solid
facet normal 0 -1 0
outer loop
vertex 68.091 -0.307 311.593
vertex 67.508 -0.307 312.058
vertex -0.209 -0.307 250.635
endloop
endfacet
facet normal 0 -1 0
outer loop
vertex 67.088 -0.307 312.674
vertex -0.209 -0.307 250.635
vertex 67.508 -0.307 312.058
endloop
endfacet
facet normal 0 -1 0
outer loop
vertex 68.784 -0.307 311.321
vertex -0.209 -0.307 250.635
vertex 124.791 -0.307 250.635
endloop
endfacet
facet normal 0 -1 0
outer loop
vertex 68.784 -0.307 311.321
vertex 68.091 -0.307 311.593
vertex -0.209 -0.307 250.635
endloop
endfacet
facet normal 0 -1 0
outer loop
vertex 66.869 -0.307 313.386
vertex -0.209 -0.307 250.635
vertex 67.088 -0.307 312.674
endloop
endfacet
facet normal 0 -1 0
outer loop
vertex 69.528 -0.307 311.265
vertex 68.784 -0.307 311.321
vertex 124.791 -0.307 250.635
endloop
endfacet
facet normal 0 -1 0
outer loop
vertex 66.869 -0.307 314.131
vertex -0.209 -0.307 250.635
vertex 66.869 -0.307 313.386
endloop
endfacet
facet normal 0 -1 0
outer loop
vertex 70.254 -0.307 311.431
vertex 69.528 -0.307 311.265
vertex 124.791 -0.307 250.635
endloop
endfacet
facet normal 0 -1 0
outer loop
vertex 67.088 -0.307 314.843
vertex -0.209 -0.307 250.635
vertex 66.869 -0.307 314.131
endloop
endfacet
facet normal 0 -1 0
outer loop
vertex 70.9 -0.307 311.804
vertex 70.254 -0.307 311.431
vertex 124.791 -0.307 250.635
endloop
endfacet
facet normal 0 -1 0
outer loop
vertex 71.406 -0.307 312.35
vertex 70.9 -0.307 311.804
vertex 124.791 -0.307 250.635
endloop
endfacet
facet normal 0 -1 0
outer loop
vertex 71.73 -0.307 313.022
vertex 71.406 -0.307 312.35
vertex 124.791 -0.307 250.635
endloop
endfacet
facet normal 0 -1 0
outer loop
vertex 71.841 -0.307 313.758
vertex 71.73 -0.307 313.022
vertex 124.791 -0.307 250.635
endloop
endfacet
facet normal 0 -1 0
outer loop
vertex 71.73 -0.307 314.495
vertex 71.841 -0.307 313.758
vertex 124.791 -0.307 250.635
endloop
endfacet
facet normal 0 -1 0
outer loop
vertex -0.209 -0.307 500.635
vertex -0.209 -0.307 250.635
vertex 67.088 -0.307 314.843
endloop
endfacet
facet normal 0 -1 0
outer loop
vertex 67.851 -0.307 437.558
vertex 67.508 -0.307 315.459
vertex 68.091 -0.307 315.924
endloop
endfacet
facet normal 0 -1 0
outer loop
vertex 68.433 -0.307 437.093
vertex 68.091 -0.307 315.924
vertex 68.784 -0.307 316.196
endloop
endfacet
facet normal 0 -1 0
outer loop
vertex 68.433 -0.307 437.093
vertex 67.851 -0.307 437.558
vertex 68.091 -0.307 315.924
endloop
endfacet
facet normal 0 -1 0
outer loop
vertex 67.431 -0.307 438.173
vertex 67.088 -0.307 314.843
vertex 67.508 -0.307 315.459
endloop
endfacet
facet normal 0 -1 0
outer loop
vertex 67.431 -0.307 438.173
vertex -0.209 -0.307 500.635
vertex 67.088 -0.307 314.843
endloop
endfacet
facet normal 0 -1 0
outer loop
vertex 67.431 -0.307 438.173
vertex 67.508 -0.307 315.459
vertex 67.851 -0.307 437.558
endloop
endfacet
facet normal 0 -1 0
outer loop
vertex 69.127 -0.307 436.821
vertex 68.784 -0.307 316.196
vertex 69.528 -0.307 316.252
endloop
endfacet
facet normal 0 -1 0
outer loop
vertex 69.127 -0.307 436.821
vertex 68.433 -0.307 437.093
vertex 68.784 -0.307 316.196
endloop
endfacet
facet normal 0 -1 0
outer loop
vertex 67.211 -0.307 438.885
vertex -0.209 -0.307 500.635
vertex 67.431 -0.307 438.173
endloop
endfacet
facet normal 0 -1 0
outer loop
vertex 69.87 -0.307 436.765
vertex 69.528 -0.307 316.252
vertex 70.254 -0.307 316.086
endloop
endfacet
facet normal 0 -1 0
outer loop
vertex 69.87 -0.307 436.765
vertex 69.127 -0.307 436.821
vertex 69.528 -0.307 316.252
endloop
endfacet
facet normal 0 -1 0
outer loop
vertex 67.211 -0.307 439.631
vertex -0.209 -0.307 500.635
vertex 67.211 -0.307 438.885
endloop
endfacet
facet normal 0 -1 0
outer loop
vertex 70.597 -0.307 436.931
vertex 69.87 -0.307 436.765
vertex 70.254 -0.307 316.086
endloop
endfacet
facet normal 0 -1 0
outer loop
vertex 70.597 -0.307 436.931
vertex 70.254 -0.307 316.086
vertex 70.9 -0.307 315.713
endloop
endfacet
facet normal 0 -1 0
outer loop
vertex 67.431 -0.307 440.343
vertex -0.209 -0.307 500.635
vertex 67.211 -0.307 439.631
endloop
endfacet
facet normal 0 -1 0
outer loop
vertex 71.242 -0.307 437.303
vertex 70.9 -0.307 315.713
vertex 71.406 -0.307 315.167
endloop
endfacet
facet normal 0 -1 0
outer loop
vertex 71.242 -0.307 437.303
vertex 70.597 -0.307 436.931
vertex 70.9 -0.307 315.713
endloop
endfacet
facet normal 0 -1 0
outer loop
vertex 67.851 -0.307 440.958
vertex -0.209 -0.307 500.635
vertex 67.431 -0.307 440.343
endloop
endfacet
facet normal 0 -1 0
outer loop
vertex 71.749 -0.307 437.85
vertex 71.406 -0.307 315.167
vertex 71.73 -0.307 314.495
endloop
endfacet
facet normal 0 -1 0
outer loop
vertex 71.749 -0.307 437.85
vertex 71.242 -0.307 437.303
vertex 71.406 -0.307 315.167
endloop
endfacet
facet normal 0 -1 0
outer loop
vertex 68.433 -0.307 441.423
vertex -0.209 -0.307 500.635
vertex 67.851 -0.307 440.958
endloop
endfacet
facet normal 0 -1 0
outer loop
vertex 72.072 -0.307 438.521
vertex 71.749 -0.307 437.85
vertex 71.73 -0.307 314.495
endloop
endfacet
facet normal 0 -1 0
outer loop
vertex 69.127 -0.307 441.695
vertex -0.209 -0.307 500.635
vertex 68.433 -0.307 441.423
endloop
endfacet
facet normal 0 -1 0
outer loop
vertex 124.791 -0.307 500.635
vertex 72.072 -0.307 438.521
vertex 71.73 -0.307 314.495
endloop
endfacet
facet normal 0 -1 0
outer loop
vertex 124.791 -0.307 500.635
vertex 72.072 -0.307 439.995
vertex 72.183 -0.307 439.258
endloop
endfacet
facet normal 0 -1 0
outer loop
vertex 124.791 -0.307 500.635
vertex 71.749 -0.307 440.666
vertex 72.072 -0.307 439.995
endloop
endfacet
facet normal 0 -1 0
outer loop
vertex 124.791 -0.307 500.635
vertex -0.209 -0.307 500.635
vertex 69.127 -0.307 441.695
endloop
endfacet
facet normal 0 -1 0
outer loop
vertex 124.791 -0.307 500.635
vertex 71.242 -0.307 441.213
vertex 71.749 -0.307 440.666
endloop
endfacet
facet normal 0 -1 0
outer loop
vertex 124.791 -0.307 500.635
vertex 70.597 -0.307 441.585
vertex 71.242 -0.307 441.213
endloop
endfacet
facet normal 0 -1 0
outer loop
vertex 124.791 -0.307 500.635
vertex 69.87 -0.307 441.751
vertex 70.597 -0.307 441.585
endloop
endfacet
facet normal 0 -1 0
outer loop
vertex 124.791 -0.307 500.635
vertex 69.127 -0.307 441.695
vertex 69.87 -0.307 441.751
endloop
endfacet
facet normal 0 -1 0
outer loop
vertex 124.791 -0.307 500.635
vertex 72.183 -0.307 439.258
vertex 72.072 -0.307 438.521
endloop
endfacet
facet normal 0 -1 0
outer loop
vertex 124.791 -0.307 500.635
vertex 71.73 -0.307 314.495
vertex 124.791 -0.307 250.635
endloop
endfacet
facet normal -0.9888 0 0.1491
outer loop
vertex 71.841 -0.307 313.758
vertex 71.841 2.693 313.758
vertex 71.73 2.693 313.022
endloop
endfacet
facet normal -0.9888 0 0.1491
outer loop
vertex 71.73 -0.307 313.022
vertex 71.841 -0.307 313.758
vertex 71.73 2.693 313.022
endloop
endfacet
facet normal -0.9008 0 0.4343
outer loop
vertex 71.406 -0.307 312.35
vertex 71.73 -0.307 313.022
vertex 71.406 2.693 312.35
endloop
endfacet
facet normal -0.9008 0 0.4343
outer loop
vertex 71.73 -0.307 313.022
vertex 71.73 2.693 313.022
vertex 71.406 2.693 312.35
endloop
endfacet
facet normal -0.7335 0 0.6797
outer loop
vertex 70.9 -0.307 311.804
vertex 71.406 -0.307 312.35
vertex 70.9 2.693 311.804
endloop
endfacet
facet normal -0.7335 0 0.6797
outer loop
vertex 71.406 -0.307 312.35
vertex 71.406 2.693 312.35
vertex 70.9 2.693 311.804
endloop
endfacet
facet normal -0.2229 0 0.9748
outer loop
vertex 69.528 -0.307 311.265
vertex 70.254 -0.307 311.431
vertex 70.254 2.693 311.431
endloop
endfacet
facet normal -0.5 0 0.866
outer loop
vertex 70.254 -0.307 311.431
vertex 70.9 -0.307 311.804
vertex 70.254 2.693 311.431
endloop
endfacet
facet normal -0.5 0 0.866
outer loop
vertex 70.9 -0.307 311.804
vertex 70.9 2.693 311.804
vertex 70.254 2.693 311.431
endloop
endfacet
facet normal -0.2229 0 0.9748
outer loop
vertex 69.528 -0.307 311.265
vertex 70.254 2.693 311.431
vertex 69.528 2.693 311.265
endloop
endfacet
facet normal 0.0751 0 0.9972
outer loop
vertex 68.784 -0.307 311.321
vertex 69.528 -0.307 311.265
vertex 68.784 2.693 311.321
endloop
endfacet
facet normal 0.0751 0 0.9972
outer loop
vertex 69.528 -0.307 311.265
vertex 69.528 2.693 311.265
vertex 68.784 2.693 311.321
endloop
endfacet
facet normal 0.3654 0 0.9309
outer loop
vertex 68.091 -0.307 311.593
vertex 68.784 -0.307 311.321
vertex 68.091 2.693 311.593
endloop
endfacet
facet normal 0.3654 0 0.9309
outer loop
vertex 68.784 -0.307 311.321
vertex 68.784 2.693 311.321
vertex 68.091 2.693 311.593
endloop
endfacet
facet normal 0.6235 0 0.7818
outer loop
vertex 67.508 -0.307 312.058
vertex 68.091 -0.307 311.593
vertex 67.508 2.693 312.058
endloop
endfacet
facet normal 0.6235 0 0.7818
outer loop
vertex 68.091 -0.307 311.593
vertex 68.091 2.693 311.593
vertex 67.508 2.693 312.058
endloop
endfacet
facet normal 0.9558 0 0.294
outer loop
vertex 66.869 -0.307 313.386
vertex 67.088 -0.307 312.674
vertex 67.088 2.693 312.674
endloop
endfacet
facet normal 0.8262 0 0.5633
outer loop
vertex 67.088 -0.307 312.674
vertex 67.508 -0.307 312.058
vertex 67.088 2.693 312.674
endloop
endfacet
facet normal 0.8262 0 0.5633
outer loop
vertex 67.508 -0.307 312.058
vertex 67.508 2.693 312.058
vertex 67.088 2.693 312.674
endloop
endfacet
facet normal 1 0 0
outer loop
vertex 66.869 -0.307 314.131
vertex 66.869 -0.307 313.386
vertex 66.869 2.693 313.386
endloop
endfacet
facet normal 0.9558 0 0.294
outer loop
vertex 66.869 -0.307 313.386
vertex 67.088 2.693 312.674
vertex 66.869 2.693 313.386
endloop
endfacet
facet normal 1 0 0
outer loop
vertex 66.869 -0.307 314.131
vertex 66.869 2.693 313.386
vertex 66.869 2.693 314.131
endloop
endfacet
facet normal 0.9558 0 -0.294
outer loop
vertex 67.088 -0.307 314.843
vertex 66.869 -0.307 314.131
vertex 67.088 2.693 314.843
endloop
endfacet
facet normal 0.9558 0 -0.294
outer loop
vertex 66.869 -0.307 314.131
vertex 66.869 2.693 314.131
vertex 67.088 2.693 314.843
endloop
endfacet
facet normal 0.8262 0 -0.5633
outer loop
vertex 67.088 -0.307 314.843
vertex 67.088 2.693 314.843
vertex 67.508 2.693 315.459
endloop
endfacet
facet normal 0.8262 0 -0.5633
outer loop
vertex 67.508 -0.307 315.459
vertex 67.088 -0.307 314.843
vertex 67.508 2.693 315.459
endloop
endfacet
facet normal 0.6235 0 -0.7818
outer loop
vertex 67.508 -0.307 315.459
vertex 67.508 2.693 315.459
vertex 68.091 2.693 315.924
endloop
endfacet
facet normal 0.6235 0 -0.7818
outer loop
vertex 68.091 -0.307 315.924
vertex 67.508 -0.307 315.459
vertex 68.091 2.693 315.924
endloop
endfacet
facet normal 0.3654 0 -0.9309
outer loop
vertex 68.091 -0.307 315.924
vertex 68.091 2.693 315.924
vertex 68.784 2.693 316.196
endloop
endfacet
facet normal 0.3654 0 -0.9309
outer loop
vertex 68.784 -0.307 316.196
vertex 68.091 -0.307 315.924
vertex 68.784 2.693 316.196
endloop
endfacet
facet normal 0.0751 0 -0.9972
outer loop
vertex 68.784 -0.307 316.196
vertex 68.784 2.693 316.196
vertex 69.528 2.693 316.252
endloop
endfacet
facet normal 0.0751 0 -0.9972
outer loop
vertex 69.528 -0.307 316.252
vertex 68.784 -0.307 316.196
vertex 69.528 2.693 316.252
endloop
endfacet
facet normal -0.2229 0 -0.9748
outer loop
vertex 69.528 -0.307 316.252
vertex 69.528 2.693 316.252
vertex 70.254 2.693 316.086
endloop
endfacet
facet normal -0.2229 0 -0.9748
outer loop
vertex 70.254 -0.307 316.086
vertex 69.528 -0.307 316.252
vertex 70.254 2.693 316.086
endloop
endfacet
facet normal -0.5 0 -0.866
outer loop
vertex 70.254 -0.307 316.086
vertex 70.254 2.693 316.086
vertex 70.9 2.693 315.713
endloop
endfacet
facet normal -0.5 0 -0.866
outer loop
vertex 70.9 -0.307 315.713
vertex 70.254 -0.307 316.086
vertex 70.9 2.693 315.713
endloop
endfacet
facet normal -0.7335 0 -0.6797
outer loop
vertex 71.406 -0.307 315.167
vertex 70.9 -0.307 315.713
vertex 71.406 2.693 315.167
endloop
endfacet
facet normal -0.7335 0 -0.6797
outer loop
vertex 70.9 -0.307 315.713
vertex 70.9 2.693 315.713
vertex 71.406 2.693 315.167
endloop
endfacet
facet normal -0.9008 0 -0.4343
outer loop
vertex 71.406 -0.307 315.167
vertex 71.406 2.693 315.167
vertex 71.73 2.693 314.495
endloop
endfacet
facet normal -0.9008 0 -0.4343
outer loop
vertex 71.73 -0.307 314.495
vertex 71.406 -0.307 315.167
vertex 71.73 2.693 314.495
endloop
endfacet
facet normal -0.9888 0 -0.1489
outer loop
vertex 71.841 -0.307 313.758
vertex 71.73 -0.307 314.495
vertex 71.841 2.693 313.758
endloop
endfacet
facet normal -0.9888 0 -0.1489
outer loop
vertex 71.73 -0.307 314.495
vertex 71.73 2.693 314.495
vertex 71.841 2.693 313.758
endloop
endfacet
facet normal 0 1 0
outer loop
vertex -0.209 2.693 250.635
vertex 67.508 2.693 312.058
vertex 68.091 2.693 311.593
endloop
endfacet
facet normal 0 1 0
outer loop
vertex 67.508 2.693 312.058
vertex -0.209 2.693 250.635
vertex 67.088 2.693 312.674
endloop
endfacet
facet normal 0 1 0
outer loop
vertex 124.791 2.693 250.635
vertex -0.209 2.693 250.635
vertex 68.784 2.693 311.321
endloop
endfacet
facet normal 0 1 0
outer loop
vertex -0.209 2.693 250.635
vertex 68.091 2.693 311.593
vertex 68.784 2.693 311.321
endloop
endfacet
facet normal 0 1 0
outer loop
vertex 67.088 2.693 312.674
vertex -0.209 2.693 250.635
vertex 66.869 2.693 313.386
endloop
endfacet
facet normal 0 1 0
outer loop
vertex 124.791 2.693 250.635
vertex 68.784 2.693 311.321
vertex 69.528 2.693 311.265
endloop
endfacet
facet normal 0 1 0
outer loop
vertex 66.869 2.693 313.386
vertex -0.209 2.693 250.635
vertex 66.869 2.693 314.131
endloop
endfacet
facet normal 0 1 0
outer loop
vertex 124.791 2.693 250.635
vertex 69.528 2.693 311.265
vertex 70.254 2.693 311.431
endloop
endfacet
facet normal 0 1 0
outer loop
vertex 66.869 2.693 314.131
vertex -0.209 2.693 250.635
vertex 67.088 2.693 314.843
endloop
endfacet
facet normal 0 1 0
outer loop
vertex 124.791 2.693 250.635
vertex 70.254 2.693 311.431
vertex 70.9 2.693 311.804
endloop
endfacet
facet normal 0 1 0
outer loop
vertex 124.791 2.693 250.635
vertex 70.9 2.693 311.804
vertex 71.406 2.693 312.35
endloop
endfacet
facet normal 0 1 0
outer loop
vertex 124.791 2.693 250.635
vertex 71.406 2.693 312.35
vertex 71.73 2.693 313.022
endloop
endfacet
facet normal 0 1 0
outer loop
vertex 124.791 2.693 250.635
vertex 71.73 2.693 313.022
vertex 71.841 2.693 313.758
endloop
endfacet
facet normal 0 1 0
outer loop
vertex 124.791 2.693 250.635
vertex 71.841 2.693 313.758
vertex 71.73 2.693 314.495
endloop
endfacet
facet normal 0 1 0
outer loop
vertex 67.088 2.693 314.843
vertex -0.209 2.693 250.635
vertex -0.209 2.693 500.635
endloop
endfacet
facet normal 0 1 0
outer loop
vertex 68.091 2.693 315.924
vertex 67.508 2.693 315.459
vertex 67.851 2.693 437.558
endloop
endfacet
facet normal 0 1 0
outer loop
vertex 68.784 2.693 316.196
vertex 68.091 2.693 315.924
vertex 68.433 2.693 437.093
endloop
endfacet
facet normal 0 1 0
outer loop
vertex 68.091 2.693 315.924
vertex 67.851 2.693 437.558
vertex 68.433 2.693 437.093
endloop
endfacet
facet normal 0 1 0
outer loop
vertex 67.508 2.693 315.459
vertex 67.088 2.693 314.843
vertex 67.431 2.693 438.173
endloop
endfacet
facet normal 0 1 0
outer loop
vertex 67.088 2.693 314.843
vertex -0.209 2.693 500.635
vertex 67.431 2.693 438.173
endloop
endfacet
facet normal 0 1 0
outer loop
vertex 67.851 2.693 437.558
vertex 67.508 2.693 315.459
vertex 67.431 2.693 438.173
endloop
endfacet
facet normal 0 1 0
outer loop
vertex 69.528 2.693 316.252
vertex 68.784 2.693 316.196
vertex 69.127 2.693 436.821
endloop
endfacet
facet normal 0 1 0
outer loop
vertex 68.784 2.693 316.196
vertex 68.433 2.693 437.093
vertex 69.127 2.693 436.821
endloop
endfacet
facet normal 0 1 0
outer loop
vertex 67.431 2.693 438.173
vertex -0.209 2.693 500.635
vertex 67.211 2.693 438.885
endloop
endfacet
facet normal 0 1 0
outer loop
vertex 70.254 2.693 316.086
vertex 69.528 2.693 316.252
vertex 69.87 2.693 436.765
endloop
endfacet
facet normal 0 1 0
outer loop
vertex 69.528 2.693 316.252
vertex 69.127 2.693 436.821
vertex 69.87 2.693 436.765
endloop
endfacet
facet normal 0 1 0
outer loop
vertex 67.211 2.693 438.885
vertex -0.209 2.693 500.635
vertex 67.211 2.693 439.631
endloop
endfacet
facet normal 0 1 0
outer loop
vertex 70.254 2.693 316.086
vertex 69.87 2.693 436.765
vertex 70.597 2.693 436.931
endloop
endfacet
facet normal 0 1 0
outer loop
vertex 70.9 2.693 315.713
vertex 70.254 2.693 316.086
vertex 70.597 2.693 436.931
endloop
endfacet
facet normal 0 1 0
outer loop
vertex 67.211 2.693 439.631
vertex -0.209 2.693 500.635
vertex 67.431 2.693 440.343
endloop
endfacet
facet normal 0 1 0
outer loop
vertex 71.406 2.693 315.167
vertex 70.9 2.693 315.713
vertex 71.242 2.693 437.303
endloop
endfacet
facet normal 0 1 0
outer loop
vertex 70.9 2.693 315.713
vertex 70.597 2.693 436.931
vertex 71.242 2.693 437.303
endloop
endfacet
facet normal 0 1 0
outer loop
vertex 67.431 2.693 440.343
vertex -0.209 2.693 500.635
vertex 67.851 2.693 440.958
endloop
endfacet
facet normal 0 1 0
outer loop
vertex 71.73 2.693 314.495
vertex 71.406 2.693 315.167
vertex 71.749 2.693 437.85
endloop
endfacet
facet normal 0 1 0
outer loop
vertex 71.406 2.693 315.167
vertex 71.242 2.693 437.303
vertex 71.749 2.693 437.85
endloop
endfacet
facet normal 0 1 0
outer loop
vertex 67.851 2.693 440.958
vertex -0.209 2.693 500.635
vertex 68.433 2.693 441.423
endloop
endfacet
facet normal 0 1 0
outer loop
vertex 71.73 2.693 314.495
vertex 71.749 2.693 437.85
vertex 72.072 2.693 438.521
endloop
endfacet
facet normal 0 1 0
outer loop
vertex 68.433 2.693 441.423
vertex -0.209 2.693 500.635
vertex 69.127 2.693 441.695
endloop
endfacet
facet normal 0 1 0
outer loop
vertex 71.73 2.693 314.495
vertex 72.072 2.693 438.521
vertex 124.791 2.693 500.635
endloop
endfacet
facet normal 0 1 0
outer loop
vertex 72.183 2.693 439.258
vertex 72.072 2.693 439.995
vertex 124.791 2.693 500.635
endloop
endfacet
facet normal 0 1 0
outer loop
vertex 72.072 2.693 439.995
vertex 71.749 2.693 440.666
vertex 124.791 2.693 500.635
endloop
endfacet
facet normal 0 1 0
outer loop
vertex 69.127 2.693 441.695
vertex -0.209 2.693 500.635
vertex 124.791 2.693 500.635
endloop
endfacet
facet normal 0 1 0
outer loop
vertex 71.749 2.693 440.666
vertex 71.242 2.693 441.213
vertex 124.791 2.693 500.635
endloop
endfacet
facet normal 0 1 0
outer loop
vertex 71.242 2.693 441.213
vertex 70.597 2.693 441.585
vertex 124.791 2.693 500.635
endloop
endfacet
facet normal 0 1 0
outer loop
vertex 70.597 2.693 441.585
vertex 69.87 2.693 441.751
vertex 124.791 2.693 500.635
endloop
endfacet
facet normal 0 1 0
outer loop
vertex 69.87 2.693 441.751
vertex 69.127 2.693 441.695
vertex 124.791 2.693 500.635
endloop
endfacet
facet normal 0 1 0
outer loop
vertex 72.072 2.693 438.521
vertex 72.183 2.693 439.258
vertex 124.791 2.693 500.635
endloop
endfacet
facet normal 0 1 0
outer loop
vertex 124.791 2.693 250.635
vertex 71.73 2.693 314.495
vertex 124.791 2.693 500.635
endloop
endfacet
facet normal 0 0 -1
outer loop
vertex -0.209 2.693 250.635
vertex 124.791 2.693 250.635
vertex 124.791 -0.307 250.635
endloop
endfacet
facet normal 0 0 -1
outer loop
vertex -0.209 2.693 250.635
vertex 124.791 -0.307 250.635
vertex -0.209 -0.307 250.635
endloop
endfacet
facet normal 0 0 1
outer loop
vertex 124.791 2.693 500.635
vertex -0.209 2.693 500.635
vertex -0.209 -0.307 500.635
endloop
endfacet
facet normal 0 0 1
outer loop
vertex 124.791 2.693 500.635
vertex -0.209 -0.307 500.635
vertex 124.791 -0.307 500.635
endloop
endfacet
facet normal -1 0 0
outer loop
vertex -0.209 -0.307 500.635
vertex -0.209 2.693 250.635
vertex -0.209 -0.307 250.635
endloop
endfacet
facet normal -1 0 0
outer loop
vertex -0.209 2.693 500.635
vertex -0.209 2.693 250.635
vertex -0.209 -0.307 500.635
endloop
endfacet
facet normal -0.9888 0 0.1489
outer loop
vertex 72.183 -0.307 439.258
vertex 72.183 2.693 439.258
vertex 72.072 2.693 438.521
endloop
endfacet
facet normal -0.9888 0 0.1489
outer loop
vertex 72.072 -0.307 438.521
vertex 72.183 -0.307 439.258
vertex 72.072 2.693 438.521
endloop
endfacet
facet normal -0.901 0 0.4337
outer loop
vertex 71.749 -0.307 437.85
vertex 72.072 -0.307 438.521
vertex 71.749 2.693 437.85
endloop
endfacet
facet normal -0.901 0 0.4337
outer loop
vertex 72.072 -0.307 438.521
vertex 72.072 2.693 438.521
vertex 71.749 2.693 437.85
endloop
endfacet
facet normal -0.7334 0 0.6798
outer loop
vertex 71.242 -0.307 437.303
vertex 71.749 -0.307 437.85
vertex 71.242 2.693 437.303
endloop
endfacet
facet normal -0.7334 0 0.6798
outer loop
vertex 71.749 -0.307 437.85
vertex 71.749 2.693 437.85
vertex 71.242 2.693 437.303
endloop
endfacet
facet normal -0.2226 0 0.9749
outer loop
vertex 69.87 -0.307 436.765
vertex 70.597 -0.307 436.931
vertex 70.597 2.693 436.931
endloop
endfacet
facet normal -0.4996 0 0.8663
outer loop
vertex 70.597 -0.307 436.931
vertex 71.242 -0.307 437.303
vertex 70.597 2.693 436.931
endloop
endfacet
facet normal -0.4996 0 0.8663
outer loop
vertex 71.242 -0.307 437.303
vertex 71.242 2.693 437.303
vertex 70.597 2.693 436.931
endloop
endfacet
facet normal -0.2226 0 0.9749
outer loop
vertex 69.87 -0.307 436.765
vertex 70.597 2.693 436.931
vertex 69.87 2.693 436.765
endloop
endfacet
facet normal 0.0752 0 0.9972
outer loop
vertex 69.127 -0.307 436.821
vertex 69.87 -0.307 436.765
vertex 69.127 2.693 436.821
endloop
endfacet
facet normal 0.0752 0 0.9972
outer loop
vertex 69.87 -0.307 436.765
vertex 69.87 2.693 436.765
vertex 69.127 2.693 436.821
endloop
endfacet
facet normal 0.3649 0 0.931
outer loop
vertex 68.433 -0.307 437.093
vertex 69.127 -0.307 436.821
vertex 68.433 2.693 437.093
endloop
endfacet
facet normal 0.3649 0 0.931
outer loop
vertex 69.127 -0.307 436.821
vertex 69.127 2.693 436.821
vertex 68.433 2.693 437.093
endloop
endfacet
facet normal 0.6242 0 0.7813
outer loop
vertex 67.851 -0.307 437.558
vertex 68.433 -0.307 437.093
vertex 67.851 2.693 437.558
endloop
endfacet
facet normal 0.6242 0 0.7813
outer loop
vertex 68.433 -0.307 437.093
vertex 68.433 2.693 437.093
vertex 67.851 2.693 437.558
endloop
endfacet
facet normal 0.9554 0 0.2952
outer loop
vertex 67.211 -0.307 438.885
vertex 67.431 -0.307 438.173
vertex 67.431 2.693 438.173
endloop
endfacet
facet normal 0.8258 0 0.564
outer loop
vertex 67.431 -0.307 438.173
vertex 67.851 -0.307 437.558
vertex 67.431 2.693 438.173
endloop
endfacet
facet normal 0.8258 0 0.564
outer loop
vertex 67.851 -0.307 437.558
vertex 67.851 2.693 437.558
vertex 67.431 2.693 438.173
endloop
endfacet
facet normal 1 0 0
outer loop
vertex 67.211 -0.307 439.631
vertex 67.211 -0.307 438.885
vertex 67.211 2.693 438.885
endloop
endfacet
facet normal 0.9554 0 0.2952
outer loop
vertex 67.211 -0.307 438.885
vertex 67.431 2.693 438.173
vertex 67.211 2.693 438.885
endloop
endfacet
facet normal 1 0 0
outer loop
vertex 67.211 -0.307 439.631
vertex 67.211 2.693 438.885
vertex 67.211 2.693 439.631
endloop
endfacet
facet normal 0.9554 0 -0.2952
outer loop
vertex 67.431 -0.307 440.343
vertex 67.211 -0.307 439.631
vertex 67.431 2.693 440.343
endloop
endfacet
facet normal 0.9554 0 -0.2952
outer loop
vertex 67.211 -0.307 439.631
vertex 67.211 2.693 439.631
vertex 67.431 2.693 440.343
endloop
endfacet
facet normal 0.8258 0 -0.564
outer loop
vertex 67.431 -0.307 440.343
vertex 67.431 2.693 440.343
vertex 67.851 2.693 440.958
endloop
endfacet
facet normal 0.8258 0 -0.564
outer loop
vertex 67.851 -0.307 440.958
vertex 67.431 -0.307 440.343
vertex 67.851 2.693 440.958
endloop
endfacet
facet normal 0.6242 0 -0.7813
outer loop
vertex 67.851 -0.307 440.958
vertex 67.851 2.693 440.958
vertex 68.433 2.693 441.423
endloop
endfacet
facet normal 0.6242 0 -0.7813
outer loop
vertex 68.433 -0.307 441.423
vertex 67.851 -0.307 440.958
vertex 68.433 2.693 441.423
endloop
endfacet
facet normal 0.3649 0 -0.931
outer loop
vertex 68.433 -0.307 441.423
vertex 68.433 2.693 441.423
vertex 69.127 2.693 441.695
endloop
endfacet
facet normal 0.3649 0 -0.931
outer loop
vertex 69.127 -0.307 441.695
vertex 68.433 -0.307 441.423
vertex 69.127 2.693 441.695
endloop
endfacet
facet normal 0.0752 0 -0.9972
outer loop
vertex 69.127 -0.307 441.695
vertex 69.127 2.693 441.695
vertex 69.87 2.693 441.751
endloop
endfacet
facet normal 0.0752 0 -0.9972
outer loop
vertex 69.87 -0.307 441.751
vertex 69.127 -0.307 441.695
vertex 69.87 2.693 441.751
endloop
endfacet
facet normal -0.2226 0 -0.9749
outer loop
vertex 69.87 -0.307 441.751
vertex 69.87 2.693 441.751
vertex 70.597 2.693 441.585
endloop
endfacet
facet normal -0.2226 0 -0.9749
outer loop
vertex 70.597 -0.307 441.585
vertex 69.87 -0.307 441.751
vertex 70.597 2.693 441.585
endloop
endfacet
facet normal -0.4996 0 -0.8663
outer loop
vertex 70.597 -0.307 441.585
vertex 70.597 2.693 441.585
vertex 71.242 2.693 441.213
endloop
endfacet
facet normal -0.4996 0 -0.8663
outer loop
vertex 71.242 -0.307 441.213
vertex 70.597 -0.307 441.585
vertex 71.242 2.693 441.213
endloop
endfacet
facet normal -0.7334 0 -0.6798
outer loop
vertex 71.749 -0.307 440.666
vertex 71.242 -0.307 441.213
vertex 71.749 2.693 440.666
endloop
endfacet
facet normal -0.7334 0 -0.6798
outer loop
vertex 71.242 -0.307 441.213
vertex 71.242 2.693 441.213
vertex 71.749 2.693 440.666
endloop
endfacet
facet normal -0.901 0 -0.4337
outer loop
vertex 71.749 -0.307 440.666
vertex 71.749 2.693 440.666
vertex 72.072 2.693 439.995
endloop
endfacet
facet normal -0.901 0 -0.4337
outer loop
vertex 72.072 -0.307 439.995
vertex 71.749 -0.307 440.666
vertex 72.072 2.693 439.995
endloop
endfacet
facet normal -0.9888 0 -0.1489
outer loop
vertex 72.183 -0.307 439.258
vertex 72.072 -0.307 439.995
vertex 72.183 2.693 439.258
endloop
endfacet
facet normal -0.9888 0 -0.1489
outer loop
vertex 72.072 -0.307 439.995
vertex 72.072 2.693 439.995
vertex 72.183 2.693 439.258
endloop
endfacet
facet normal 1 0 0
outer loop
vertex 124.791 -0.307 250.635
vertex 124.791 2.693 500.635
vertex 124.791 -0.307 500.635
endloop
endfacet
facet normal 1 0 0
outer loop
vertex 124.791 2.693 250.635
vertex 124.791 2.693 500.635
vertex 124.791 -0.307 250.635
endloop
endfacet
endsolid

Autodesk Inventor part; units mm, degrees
ref_plane "YZ Plane" through (0, 0, 0) normal (1, 0, 0) x (0, 1, 0)
ref_plane "XZ Plane" through (0, 0, 0) normal (0, 1, 0) x (-1, 0, 0)
ref_plane "XY Plane" through (0, 0, 0) normal (0, 0, 1) x (1, 0, 0)
ref_plane "Work Plane1" through (70.0345, 2.6931, 201.8136) normal (0, -1, 0) x (1, 0, 0)
sketch "Sketch1" plane through (70.0345, 2.6931, 201.8136) normal (0, -1, 0) x (1, 0, 0)
  line L0 (-70.2433, 298.8217) -> (54.7567, 298.8217)
  line L1 (54.7567, 298.8217) -> (54.7567, 48.8217)
  line L2 (54.7567, 48.8217) -> (-70.2433, 48.8217)
  line L3 (-70.2433, 48.8217) -> (-70.2433, 298.8217)
  circle A0 centre (-0.3511, 237.4444) radius 2.5
  circle A1 centre (-0.6937, 111.9449) radius 2.5
  point P0 (-70.0345, -201.8136)
  dimension "d0" = 125
  dimension "d1" = 250
  dimension "d2" = 5
  dimension "d3" = 5
  dimension "d4" = 125.5
extrude "Extrusion1" add sketch "Sketch1" along normal blind 3
properties part number "Plate"
